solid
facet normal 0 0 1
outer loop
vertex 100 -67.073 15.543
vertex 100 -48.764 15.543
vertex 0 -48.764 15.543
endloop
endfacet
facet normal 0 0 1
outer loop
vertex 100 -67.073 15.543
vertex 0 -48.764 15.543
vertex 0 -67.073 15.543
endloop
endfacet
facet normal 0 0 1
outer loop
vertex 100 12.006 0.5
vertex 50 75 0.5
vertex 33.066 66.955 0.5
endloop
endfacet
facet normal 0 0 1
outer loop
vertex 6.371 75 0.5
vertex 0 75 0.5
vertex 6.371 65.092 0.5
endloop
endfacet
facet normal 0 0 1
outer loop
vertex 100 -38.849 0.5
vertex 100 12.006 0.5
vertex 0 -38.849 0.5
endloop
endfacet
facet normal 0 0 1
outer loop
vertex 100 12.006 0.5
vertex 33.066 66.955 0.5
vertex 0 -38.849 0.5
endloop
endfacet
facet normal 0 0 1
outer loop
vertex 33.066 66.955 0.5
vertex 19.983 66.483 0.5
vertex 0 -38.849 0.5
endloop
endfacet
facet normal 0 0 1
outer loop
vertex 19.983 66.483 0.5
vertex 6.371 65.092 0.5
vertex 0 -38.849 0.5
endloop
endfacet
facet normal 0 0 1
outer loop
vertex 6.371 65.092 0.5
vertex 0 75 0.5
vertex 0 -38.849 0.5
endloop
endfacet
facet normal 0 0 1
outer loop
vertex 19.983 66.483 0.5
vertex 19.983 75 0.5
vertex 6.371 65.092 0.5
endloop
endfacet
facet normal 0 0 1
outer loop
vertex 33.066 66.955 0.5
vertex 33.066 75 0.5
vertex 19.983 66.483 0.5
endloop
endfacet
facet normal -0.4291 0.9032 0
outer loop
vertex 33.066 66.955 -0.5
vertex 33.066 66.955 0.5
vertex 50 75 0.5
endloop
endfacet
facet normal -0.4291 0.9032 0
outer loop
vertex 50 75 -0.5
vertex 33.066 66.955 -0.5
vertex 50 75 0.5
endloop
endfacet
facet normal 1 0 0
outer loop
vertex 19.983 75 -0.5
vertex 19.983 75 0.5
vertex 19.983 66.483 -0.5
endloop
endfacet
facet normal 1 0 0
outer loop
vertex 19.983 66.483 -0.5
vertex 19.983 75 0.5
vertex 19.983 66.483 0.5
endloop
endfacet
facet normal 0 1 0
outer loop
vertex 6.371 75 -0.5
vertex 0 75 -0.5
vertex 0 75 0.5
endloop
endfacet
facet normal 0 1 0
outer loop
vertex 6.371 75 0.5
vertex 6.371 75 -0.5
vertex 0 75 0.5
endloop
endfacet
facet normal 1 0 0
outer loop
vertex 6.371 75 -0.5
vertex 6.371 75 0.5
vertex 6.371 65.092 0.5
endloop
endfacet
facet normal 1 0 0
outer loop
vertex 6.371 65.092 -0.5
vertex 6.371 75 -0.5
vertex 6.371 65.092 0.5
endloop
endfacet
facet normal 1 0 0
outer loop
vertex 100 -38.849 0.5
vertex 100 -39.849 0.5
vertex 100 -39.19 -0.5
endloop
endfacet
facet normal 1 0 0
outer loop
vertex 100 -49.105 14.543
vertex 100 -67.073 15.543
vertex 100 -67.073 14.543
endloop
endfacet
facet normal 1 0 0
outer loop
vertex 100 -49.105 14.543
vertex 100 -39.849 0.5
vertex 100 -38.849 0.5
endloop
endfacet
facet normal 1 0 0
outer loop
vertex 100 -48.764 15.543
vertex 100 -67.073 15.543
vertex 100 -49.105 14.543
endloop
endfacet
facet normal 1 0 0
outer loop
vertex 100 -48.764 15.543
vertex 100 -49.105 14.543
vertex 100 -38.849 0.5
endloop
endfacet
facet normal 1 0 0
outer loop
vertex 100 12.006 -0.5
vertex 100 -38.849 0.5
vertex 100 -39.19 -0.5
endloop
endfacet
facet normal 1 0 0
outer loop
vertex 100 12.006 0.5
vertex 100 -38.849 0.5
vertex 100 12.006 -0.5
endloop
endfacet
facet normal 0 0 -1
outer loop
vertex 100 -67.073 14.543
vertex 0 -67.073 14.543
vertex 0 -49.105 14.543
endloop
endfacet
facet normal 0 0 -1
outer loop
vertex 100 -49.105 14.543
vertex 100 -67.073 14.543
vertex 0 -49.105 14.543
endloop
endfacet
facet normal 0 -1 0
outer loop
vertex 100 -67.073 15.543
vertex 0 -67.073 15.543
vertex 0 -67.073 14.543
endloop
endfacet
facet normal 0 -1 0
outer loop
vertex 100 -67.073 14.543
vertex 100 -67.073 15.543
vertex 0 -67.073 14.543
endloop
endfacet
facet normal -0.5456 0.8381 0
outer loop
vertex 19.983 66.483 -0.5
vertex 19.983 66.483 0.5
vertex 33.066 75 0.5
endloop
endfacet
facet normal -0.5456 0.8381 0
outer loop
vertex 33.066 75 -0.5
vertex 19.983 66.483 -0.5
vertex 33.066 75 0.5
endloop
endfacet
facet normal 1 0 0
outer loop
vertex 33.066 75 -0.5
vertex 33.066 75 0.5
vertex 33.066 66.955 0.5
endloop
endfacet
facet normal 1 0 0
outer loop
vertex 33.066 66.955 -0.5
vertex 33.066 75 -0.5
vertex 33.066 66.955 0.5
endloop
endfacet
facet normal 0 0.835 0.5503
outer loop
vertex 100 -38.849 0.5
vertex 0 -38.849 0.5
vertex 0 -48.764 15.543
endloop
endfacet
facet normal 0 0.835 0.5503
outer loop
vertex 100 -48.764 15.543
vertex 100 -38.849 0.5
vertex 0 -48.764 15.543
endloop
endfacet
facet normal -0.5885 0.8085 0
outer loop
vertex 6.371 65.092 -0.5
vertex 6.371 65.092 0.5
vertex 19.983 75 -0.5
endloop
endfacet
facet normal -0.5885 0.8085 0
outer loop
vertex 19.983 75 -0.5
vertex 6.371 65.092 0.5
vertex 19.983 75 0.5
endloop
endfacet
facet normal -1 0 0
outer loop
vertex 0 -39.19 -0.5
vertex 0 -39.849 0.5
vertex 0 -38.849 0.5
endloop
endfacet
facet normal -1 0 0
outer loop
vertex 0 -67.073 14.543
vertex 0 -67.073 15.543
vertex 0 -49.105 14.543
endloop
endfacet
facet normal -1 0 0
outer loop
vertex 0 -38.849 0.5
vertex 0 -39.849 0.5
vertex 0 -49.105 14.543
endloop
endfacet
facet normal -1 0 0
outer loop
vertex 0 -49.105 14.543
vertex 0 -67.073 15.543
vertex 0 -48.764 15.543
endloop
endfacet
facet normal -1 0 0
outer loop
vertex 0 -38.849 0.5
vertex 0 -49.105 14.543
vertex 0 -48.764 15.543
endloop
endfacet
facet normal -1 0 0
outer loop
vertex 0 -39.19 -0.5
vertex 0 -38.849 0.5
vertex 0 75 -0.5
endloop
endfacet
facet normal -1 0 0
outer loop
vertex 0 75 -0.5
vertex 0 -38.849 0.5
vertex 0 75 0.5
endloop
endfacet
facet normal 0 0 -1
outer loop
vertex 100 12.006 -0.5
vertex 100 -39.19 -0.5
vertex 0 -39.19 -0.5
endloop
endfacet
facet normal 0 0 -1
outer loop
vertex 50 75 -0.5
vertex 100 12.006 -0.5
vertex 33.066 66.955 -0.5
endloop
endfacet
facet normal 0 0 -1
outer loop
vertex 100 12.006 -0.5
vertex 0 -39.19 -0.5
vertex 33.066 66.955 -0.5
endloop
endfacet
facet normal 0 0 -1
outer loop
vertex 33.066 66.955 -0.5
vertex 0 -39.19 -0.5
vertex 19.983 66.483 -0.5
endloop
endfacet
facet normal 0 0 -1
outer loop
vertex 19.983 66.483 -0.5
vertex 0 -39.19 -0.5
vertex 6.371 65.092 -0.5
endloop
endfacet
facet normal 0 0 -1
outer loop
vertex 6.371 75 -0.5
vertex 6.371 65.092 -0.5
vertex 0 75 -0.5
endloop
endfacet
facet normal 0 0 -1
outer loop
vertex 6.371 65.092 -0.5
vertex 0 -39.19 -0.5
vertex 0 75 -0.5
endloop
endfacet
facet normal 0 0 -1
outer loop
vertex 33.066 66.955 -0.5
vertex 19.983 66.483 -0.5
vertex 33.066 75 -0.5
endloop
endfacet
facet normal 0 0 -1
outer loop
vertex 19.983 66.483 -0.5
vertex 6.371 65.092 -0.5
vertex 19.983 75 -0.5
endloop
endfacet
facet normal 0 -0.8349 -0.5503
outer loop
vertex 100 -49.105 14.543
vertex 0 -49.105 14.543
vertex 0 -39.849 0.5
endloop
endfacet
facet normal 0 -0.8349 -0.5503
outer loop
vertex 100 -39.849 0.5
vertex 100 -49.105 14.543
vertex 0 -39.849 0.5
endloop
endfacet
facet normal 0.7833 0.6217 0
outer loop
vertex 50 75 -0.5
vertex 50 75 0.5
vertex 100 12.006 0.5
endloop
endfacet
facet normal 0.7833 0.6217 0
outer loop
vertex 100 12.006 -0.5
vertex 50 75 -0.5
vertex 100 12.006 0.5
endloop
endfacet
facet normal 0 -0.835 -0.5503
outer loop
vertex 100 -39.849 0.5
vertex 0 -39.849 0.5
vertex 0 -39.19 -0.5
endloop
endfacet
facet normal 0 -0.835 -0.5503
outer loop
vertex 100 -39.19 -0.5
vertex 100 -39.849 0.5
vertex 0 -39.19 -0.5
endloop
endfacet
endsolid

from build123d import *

# Parameters (mm, degrees)
F1_DEPTH = 100
F3_DEPTH = 25


with BuildPart() as f1:
    # F0 (on Right) → F1 (new body)
    with BuildSketch(Plane.YZ):
        Polygon((75, 0.5), (-38.848786, 0.5), (-48.764013, 15.543181), (-67.072637, 15.543181), (-67.072637, 14.543181), (-49.104895, 14.543181), (-39.848786, 0.5), (-39.189668, -0.5), (75, -0.5), align=None)
    extrude(amount=F1_DEPTH)

    # F2 (on face) → F3 (cut)
    with BuildSketch(Plane.XY.offset(0.5)):
        Polygon((33.065695, 66.954866), (50, 75), (33.065695, 75), align=None)
        Polygon((19.983491, 66.483282), (33.065695, 75), (19.983491, 75), align=None)
        Polygon((6.371066, 65.092333), (19.983491, 75), (6.371066, 75), align=None)
        Polygon((50, 75), (100, 12.005576), (100, 75), align=None)
        Polygon((100, 75), (100, 12.005576), (155.00921, 119.249597), (16.864885, 99.318206), (6.371066, 75), (19.983491, 75), (33.065695, 75), (50, 75), align=None)
    extrude(amount=-F3_DEPTH, mode=Mode.SUBTRACT)


solid = f1.part
